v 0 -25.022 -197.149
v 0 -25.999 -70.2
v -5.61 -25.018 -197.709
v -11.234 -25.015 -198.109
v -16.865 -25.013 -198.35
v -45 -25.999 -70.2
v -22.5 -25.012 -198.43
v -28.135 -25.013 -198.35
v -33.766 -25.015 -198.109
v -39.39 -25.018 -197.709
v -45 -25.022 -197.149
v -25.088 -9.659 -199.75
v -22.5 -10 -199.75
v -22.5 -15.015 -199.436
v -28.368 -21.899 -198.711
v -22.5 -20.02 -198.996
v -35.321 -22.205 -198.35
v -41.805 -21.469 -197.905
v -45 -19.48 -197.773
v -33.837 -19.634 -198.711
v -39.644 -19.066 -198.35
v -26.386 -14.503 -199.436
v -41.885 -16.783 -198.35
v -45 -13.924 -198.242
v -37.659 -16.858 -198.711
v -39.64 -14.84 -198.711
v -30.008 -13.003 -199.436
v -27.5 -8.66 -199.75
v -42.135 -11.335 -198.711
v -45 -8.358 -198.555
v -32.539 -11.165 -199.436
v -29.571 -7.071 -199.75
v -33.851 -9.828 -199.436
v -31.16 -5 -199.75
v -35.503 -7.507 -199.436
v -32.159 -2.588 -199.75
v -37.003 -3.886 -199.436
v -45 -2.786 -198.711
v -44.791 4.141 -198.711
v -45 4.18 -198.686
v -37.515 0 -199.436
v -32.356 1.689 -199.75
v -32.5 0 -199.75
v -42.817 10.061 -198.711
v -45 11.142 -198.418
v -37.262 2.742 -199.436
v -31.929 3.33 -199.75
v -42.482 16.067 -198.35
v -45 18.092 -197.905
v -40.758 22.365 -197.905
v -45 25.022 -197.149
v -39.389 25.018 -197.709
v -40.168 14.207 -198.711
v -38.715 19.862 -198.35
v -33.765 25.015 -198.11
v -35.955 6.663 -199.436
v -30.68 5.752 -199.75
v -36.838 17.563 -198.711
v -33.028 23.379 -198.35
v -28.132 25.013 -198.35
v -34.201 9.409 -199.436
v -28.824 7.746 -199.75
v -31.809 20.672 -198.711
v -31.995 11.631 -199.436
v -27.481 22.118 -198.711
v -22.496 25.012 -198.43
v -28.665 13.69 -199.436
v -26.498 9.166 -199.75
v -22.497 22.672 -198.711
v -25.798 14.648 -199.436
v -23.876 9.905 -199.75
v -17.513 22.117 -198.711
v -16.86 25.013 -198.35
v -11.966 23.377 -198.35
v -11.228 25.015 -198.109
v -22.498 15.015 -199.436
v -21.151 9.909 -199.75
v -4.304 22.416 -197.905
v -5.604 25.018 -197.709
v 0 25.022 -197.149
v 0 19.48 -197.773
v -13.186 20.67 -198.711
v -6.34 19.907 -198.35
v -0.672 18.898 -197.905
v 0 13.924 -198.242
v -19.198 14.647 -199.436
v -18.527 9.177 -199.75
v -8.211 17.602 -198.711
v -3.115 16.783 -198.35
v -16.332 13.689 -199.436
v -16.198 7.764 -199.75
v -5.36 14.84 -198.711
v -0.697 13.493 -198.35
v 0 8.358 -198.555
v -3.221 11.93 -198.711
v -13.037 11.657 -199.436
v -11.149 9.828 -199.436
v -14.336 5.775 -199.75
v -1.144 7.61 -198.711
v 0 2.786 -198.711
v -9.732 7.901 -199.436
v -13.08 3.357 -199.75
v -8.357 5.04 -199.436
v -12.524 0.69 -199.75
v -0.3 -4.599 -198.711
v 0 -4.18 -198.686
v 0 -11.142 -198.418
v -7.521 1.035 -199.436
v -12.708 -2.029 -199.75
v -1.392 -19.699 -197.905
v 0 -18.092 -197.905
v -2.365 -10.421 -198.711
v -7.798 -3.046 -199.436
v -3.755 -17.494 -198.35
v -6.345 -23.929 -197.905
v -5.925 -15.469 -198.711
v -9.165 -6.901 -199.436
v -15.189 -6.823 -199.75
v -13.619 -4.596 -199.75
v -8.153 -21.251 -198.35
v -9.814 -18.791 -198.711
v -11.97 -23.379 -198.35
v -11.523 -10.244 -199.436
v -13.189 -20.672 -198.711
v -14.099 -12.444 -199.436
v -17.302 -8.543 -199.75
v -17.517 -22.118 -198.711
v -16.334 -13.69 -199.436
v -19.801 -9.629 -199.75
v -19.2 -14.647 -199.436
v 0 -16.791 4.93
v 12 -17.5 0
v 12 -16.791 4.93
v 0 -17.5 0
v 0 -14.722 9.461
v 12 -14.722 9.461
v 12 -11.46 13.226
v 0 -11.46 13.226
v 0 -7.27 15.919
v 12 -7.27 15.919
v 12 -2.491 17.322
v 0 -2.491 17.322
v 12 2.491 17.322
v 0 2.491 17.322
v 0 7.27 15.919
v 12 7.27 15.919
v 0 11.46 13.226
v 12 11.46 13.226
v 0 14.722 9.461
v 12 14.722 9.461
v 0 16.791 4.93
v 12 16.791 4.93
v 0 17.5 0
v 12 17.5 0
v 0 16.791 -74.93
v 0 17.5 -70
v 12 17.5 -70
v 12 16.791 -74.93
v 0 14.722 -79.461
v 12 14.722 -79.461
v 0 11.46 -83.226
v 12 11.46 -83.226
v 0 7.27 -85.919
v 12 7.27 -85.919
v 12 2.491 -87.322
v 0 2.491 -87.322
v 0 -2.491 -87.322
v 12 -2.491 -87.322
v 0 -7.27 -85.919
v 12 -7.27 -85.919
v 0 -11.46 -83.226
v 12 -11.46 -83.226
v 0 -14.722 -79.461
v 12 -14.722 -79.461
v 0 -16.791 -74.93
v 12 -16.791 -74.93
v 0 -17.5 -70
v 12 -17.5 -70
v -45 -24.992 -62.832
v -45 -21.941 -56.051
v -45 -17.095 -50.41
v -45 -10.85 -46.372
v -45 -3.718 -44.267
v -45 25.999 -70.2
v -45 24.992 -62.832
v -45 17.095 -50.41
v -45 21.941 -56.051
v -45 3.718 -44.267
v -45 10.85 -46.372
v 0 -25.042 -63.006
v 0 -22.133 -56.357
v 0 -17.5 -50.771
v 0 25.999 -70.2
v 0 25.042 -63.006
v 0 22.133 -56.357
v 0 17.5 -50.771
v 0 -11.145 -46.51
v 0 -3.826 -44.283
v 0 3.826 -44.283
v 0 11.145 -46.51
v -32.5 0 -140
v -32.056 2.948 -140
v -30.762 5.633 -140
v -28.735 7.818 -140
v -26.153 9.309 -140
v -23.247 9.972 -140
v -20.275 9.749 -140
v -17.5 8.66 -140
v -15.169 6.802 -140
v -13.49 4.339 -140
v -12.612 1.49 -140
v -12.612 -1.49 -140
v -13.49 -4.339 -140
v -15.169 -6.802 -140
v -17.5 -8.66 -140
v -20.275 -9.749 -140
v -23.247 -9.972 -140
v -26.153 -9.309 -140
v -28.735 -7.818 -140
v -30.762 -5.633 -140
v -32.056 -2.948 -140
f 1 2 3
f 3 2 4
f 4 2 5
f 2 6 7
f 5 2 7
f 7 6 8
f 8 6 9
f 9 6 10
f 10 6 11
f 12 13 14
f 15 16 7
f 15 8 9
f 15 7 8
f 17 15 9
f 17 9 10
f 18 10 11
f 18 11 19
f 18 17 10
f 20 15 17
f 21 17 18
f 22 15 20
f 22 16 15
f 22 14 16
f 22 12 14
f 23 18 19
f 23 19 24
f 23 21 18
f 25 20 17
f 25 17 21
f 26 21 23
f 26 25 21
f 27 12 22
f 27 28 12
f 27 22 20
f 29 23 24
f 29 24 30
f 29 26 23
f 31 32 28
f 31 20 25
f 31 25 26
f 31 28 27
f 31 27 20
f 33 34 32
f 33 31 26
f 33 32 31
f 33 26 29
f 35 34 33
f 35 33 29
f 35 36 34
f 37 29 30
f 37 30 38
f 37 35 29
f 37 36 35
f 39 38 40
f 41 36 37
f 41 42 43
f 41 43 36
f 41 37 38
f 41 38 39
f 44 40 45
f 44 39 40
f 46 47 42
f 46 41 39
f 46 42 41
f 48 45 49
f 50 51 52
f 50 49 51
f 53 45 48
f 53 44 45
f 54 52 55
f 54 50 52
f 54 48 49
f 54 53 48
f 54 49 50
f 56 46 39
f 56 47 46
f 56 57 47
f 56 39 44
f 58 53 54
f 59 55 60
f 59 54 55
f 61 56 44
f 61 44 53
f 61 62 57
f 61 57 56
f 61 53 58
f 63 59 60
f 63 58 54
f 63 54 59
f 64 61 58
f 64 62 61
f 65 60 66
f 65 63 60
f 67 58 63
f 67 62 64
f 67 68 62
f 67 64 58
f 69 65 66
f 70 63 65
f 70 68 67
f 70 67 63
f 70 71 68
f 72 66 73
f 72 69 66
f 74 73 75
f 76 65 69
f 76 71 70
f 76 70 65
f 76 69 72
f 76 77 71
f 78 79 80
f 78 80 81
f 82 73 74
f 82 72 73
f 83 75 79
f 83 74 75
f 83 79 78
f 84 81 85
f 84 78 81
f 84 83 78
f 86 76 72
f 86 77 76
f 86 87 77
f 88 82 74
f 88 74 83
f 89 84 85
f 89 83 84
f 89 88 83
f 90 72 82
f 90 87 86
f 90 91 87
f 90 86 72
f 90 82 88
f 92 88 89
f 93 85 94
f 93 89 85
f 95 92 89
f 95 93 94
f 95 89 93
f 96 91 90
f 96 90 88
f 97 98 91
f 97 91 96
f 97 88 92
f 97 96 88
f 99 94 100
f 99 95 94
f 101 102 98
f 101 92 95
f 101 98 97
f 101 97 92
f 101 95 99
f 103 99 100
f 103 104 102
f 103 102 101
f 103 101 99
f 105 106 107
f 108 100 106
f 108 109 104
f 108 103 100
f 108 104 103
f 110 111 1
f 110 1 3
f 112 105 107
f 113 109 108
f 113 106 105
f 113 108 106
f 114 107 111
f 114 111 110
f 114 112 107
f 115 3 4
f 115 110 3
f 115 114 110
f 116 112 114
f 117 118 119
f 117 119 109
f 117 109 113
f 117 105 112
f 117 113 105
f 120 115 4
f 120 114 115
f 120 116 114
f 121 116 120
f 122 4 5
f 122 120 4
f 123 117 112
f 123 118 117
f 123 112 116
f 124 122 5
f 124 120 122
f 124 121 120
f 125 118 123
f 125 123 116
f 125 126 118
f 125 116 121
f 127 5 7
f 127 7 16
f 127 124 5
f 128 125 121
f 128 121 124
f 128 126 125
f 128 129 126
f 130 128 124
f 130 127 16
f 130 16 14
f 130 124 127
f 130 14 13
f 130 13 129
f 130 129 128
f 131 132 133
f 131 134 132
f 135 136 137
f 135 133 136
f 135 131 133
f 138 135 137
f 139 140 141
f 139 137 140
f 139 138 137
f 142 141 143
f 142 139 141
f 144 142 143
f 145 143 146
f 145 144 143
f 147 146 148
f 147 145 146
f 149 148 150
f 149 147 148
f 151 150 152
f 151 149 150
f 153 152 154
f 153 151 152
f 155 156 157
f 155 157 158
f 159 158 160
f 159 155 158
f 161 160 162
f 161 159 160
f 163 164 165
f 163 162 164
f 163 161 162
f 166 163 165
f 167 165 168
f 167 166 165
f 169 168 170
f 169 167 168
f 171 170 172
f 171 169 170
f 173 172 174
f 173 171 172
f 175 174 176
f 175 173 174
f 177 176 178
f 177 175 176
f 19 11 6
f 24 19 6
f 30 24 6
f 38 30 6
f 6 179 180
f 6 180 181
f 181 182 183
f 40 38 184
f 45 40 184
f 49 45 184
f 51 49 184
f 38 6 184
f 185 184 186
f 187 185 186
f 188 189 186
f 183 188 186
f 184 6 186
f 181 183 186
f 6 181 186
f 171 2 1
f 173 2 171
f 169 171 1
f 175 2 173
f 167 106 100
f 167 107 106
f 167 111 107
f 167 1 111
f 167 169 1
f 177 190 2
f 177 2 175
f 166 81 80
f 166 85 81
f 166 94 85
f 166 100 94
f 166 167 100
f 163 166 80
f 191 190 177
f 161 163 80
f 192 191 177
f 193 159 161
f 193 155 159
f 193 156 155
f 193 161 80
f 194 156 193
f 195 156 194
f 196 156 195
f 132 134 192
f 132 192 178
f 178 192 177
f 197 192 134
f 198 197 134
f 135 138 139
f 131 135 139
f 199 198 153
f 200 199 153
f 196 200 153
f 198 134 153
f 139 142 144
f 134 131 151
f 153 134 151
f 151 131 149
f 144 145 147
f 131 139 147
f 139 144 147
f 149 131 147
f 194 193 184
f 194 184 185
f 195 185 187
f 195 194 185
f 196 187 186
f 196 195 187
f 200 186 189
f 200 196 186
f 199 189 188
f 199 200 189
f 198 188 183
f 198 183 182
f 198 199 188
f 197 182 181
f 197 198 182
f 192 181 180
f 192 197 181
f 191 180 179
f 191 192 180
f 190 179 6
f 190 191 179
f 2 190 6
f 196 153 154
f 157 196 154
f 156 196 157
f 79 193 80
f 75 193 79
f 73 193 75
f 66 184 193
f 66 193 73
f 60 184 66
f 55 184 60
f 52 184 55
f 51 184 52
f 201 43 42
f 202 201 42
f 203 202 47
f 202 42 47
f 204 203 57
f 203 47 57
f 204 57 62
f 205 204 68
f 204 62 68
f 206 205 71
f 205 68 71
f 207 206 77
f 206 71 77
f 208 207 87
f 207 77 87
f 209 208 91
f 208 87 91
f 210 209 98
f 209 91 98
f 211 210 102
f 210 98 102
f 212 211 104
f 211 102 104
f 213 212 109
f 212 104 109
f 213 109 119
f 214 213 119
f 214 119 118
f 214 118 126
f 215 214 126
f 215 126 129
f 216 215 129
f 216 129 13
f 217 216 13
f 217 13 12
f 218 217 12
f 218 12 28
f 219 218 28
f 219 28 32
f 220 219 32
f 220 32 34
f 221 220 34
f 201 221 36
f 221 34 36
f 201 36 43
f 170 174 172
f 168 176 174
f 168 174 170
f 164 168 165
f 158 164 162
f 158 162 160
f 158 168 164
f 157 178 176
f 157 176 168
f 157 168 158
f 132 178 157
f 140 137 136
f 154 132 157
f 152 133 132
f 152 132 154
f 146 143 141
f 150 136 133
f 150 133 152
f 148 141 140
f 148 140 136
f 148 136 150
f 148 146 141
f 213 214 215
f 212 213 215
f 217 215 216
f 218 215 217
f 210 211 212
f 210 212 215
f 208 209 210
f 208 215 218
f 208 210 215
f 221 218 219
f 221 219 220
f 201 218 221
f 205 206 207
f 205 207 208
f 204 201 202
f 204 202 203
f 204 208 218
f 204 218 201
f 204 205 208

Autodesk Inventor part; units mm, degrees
ref_plane "YZ Plane" through (0, 0, 0) normal (1, 0, 0) x (0, 1, 0)
ref_plane "XY Plane" through (0, 0, 0) normal (0, 0, 1) x (1, 0, 0)
ref_plane "UCS1: YZ Plane" through (0, 0, 0) normal (1, 0, 0) x (0, 1, 0)
sketch "Sketch2" plane through (0, 0, 0) normal (1, 0, 0) x (0, 1, 0)
  circle A0 centre (0, -70) radius 26
  line L0 (25, -200) -> (-25, -200)
  line L1 (0, -70) -> (0, -200) construction
  line L2 (-25.9992, -70.2001) -> (-25, -200)
  line L3 (25.9992, -70.2001) -> (25, -200)
  circle A1 centre (0, 0) radius 17.5
  circle A2 centre (0, -70) radius 17.5
  line L4 (17.5, 0) -> (17.5, -70)
  line L5 (-17.5, 0) -> (-17.5, -70)
  dimension "d1" = 52
  dimension "d3" = 50
  dimension "d25" = 130
  dimension "d26" = 35
  dimension "d27" = 70
extrude "Extrusion1" add sketch "Sketch2" against normal blind 45 contours A0 L5 A2 L4 | A0 L4 A2 L5 | A2
extrude "Extrusion2" add sketch "Sketch2" along normal blind 45 from surface at -45 contours A0 L3 L0 L2
sketch "Sketch5" plane through (-45, -25, -200) normal (0, 0, -1) x (-1, 0, 0)
  circle A0 centre (-22.5, 25) radius 10
  line L0 (-45, 50) -> (-45, 0) projected
  line L1 (-45, 50) -> (0, 50) projected
  point P0 (-45, 25)
  point P1 (-45, 25)
  point P2 (45, 0)
  point P3 (-22.5, 50)
  dimension "d22" = 20
extrude "Extrusion4" cut sketch "Sketch5" against normal blind 60
ref_plane "Work Plane1" through (-22.5, 0, -70) normal (1, 0, 0) x (0, 0, -1)
sketch "Sketch4" plane through (-22.5, 0, -70) normal (1, 0, 0) x (0, 0, -1)
  line L0 (130, 25) -> (130, -25) projected
  arc A0 (125.9592, -40) -> (130, 0) centre (-70, 0) ccw
  line L1 (125.9592, -40) -> (130, -40)
  line L2 (130, -40) -> (130, 0)
  line L3 (201.2, 0) -> (-115.2, 0) projected
  line L4 (-70, 0) -> (130, 0)
  point P0 (-70, 0)
  point P1 (156, -25)
  point P2 (156, 25)
  point P3 (156, -25)
  point P4 (-25, -130)
  point P5 (25, -130)
  dimension "d18" = 40
revolve "Revolution1" cut sketch "Sketch4" angle 360 about axis through (-22.5, 0, 0) along (0, 0, -1)
extrude "Extrusion5" add sketch "Sketch2" along normal blind 12 contours L5 A1 L4 A0 | A0 L4 A2 L5 | A1 | A2 picked at (-13.2429, -51.1519)
properties part number "shank_inventor"
